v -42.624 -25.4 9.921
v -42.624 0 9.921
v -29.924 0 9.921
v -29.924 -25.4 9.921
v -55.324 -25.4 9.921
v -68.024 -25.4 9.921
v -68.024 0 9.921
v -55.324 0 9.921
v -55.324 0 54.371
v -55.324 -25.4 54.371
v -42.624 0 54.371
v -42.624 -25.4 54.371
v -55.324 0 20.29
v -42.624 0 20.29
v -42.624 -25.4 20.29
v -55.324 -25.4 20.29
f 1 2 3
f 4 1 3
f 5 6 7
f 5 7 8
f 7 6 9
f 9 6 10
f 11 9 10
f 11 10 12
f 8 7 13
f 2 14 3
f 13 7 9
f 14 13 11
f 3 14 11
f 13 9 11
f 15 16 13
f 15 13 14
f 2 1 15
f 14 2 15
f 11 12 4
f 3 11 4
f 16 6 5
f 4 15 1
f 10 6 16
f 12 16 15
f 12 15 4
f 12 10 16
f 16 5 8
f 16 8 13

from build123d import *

# Parameters (mm, degrees)
F0_W     = 38.1
F0_H     = 44.45
F1_DEPTH = 25.4
F2_W     = 12.7
F2_H     = 10.368286
F3_DEPTH = 25.401
F5_DEPTH = 25.401


with BuildPart() as f1:
    # F0 (on Front) → F1 (new body)
    with BuildSketch(Plane.XZ):
        with Locations((-48.974418, 32.146238)):
            Rectangle(F0_W, F0_H)
    extrude(amount=F1_DEPTH)

    # F2 (on face) → F3 (cut, through all)
    with BuildSketch(Plane.XZ.offset(25.4)):
        with Locations((-48.974418, 15.105381)):
            Rectangle(F2_W, F2_H)
    extrude(amount=-F3_DEPTH, mode=Mode.SUBTRACT)

    # F4 (on face) → F5 (cut, through all)
    with BuildSketch(Plane.XZ.offset(25.4)):
        Polygon((-68.024418, 54.371238), (-68.024418, 9.921238), (-55.324418, 54.371238), align=None)
        Polygon((-29.924418, 54.371238), (-42.624418, 54.371238), (-29.924418, 9.921238), align=None)
    extrude(amount=-F5_DEPTH, mode=Mode.SUBTRACT)


solid = f1.part
